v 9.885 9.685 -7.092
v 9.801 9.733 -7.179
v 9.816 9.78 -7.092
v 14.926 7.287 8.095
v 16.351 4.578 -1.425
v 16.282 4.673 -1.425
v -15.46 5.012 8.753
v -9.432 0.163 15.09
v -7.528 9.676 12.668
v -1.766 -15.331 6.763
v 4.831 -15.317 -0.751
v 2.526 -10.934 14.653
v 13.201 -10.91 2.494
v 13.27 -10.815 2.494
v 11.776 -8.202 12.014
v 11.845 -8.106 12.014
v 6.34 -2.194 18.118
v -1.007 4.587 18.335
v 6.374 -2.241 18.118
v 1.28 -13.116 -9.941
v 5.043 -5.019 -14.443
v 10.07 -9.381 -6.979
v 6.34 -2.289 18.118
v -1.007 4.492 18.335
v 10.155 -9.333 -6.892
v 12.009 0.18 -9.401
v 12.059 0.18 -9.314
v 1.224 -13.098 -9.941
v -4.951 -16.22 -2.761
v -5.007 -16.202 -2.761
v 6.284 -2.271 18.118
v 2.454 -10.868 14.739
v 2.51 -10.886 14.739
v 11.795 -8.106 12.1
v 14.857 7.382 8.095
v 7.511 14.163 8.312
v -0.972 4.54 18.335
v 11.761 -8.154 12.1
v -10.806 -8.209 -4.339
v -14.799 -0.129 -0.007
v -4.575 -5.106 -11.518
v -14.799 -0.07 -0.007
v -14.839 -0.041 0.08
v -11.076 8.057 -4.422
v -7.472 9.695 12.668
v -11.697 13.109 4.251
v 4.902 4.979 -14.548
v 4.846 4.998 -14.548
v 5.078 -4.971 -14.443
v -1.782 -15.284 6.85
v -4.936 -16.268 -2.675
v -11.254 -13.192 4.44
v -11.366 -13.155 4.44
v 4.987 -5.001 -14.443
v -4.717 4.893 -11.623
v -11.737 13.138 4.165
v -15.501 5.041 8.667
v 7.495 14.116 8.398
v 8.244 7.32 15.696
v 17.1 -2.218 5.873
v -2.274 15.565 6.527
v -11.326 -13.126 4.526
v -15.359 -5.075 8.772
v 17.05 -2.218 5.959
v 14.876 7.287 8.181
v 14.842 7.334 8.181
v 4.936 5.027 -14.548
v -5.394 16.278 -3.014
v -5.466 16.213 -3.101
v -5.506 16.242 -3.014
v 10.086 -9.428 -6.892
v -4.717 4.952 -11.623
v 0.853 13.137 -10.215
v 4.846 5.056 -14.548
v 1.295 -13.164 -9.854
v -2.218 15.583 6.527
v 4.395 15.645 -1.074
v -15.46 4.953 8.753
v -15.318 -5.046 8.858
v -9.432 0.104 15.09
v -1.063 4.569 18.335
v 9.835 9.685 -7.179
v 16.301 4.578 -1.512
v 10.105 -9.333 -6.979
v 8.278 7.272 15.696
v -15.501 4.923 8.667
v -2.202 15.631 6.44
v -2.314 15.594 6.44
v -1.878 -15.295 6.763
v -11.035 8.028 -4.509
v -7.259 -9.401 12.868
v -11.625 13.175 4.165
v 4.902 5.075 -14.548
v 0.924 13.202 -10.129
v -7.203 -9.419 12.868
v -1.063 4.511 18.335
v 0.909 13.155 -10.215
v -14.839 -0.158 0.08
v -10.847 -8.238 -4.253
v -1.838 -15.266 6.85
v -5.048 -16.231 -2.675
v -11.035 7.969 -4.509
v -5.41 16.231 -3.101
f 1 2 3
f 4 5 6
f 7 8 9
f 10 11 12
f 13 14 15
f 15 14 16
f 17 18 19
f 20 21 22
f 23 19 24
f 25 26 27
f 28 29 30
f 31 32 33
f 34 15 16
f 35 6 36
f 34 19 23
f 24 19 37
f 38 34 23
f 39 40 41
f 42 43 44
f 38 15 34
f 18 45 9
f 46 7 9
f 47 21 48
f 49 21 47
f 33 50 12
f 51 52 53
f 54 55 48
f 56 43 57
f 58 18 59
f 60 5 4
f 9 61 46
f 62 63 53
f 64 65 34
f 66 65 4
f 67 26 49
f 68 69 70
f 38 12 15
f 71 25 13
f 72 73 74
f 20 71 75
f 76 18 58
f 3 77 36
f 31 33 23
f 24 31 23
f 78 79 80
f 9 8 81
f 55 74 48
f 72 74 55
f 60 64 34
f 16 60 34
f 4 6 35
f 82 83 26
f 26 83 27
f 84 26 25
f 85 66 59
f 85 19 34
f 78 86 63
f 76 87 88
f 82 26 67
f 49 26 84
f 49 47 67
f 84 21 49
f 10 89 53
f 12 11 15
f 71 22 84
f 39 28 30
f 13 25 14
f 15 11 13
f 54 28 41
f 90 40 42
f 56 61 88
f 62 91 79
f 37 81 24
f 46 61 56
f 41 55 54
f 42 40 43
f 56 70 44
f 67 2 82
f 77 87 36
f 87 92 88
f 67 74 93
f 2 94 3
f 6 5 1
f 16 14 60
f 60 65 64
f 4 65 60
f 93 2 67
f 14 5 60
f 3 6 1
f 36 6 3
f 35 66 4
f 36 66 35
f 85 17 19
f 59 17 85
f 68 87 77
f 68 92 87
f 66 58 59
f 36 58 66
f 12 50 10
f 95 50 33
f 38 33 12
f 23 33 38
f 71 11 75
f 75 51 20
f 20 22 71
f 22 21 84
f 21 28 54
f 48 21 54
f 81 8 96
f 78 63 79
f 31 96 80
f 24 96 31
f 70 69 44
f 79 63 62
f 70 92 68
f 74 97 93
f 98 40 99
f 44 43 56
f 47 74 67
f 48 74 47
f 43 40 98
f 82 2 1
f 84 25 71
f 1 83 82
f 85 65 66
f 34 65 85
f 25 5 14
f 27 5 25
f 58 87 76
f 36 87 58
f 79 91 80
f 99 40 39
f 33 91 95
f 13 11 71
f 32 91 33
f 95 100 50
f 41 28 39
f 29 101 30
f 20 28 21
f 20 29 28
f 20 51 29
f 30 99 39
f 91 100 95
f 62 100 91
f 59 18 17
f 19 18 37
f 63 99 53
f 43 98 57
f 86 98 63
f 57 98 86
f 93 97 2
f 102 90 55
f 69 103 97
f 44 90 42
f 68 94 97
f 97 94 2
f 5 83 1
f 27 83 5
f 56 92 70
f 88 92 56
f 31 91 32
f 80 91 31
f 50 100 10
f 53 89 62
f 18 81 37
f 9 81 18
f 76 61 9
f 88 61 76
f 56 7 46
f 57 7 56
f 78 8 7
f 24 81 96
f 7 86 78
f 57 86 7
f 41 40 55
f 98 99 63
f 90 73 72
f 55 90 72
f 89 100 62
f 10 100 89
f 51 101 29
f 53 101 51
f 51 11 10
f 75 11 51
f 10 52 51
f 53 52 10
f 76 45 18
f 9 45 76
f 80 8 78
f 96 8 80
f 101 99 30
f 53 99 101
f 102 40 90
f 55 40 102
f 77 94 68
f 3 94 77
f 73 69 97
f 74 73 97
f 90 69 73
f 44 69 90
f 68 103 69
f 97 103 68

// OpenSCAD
// Auto-generated OpenSCAD file

    inner_points = 10*[[0.9785360441964507, 0.9685060087804973, -0.7092049571073851], [-0.7218333121630555, -0.9371211507350073, 1.2781211700972077], [-1.1656165136305032, 1.3079692585994611, 0.41648198007898896], [0.12642830900148935, -1.3068898411312557, -0.9853981930688116], [-0.22333094402334933, 1.5535674106354085, 0.6440329700277245], [1.005476703886223, -0.9333113753571688, -0.6892343037094695], [-0.7487739718528278, 0.9646962334026586, 1.2581505166992923], [0.4800336760567444, -1.5221825525899184, -0.07511675703790183], [0.08934767207892022, 1.3107372224336087, -1.012885439345699], [0.48861147976637076, 0.5027013227208416, -1.446090236925663], [-1.5277996843953847, -0.5016219052526364, 0.8771740239358404], [-1.128535876707934, -1.309657804965403, 0.4439692263558762], [0.43644277299934864, 1.5550226153402404, -0.10742995301327285], [1.1958876650432781, 0.018046999695751874, -0.9314344442707686], [-0.939184933009883, 0.013337858349738127, 1.5003506572605914], [-0.17974004096595367, -1.5236377572947502, 0.6763461660030955], [-0.5425111962571489, 1.6183222038887703, -0.3014461589511666], [0.5027750227462976, -0.4971432456893552, -1.4355910431050312], [-1.5419632273753114, 0.4982226631575605, 0.8666748301152085], [-0.4966770083718649, -1.617242786420565, -0.2674700540386561], [1.4826091915535184, 0.7286877016062595, 0.809489031294333], [0.6324245133737653, -0.22412587815149274, 1.8031520948966295], [1.6999608124003458, -0.22177130747848592, 0.5872595441309494], [1.1745177845708672, -0.8106424847112358, 1.2013770908025172], [0.8228354745308205, 0.7272324969014278, 1.5609519543353303], [1.6251024487516763, 0.45780294600218496, -0.14251785987525334], [0.24947474274244444, -1.083881810988317, 1.4652627503986109], [0.7479771108821508, 1.4068067503820987, 0.8311745503291275], [-0.10220756729760253, 0.45399317062434624, 1.824837613931424], [1.317011041769025, -1.0815272403153102, 0.2493701996329309], [-1.0994824342008114, 0.7998110906252263, -0.4422389058083036], [-0.453460022884815, -0.5076184592401323, -1.1431789923822038], [-1.4758291479456198, -0.00993550481667447, 0.007953944227915899], [-1.0765653402581692, -0.8179714045294413, -0.42525085335204815], [-0.4676235658647422, 0.4922261091700644, -1.1536781862028358]];

    outer_points = 10*[[1.6675078734833215, 0.0606578658798944, -0.14037183476169734], [-1.3812010323162374, 0.0606578658798944, 0.9447594765080658], [-0.21947760683013753, 1.5412866403759968, -0.6166289071353418], [-0.0668292343369466, -1.6626023721357857, -0.1877587346110266], [0.5416162372999497, 1.5841976272977822, 0.030591926605881947], [0.6867934666614489, -1.4628818955379934, 0.4384716988297587], [-0.40048662549436476, 1.5841976272977822, 0.36591594291660967], [-0.2553093961328655, -1.4628818955379934, 0.7737957151404864], [1.2830083443582905, 0.43437021059876024, -0.9844685090279552], [1.3301792856223638, -0.5556859423585491, -0.8519403373374261], [-1.616486126789448, 0.43437021059876024, 0.047552695591057736], [-1.5693151855253746, -0.5556859423585491, 0.1800808672815868], [1.3315198473616163, 1.0022572216480545, -0.16279279637858096], [1.421244309499562, -0.8809414898882658, 0.08929076617934018], [-1.1349374683324778, 1.0022572216480545, 0.7150968755670284], [-1.0452130061945322, -0.8809414898882658, 0.9671804381249495], [0.6910920823419752, 1.2353424637267059, -0.8945875406321075], [0.814587209852644, -1.3566581954864947, -0.5476242826794208], [-1.100894051019728, 1.2353424637267059, -0.25676335906694764], [-0.9773989235090593, -1.3566581954864947, 0.09019989888573907], [1.3498755222367103, 0.5145289147819359, 1.3798731287754311], [-0.1744789306630692, 0.5145289147819359, 1.9224387844103128], [1.1036119582529507, -0.4270704409862244, 1.6095357297164685], [0.16150909545863612, -0.4270704409862244, 1.9448597460271964], [0.5599719121750438, 1.0964693204316633, 1.573257851759894], [1.6788523044425723, -0.24077480503880566, 0.8130481402697834], [-0.7876050112515218, -0.24077480503880566, 1.6909378122153926], [1.1352122583646653, 1.2827649563790822, 0.7767702623132089], [-0.38914219453511406, 1.2827649563790822, 1.3193359179480906], [0.4904858776644981, -1.182374160806966, 1.3780347575215486], [-0.10820638536813701, 0.6663583620181512, -1.0879241680961655], [-0.03188219912154147, -0.93558614423774, -0.8734890818340078], [-0.9896228295577276, 0.3604141853688603, -0.7280586200277711], [-0.9424518882936543, -0.629641967588449, -0.595530448337242], [0.483709876648178, -0.13461389110979438, -1.177805136492013]];

    // Convex hull for inner set (I)
    module inner_hull() {
        hull() {
            for (p = inner_points) {
                translate(p) sphere(r=0.1);
            }
        }
    }

    // Convex hull for outer set (O) minus inner hull (O \ I)
    module outer_minus_inner() {
        difference() {
            hull() {
                for (p = outer_points) {
                    translate(p) sphere(r=0.1);
                }
            }
            inner_hull(); // Subtract inner hull
        }
    }

    // Convex hull for outer set (O) minus all translated inner hulls
    module outer_minus_AllTranslationInner() {
        difference() {
            hull() {
                for (p = outer_points) {
                    translate(p) sphere(r=0.1);
                }
            }
            hull() {
                translate([0,0,50]) inner_hull();
                translate([0,0,-50]) inner_hull();
            }; // Subtract translated inner hulls
        }
    }

    // Difference between outer_minus_inner and outer_minus_AllTranslationInner
    module outer_minus_inner_diff() {
        difference() {
            // Outer minus inner
            difference() {
                hull() {
                    for (p = outer_points) {
                        translate(p) sphere(r=0.1);
                    }
                }
                inner_hull();
            }

            // Subtract Outer minus AllTranslationInner
            difference() {
                hull() {
                    for (p = outer_points) {
                        translate(p) sphere(r=0.1);
                    }
                }
                hull() {
                    translate([0,0,50]) inner_hull();
                    translate([0,0,-50]) inner_hull();
                };
            }
        }
    }

    // Rendering all with colors applied
    color([1, 0, 0, 0.5]) inner_hull(); // Transparent red
    
